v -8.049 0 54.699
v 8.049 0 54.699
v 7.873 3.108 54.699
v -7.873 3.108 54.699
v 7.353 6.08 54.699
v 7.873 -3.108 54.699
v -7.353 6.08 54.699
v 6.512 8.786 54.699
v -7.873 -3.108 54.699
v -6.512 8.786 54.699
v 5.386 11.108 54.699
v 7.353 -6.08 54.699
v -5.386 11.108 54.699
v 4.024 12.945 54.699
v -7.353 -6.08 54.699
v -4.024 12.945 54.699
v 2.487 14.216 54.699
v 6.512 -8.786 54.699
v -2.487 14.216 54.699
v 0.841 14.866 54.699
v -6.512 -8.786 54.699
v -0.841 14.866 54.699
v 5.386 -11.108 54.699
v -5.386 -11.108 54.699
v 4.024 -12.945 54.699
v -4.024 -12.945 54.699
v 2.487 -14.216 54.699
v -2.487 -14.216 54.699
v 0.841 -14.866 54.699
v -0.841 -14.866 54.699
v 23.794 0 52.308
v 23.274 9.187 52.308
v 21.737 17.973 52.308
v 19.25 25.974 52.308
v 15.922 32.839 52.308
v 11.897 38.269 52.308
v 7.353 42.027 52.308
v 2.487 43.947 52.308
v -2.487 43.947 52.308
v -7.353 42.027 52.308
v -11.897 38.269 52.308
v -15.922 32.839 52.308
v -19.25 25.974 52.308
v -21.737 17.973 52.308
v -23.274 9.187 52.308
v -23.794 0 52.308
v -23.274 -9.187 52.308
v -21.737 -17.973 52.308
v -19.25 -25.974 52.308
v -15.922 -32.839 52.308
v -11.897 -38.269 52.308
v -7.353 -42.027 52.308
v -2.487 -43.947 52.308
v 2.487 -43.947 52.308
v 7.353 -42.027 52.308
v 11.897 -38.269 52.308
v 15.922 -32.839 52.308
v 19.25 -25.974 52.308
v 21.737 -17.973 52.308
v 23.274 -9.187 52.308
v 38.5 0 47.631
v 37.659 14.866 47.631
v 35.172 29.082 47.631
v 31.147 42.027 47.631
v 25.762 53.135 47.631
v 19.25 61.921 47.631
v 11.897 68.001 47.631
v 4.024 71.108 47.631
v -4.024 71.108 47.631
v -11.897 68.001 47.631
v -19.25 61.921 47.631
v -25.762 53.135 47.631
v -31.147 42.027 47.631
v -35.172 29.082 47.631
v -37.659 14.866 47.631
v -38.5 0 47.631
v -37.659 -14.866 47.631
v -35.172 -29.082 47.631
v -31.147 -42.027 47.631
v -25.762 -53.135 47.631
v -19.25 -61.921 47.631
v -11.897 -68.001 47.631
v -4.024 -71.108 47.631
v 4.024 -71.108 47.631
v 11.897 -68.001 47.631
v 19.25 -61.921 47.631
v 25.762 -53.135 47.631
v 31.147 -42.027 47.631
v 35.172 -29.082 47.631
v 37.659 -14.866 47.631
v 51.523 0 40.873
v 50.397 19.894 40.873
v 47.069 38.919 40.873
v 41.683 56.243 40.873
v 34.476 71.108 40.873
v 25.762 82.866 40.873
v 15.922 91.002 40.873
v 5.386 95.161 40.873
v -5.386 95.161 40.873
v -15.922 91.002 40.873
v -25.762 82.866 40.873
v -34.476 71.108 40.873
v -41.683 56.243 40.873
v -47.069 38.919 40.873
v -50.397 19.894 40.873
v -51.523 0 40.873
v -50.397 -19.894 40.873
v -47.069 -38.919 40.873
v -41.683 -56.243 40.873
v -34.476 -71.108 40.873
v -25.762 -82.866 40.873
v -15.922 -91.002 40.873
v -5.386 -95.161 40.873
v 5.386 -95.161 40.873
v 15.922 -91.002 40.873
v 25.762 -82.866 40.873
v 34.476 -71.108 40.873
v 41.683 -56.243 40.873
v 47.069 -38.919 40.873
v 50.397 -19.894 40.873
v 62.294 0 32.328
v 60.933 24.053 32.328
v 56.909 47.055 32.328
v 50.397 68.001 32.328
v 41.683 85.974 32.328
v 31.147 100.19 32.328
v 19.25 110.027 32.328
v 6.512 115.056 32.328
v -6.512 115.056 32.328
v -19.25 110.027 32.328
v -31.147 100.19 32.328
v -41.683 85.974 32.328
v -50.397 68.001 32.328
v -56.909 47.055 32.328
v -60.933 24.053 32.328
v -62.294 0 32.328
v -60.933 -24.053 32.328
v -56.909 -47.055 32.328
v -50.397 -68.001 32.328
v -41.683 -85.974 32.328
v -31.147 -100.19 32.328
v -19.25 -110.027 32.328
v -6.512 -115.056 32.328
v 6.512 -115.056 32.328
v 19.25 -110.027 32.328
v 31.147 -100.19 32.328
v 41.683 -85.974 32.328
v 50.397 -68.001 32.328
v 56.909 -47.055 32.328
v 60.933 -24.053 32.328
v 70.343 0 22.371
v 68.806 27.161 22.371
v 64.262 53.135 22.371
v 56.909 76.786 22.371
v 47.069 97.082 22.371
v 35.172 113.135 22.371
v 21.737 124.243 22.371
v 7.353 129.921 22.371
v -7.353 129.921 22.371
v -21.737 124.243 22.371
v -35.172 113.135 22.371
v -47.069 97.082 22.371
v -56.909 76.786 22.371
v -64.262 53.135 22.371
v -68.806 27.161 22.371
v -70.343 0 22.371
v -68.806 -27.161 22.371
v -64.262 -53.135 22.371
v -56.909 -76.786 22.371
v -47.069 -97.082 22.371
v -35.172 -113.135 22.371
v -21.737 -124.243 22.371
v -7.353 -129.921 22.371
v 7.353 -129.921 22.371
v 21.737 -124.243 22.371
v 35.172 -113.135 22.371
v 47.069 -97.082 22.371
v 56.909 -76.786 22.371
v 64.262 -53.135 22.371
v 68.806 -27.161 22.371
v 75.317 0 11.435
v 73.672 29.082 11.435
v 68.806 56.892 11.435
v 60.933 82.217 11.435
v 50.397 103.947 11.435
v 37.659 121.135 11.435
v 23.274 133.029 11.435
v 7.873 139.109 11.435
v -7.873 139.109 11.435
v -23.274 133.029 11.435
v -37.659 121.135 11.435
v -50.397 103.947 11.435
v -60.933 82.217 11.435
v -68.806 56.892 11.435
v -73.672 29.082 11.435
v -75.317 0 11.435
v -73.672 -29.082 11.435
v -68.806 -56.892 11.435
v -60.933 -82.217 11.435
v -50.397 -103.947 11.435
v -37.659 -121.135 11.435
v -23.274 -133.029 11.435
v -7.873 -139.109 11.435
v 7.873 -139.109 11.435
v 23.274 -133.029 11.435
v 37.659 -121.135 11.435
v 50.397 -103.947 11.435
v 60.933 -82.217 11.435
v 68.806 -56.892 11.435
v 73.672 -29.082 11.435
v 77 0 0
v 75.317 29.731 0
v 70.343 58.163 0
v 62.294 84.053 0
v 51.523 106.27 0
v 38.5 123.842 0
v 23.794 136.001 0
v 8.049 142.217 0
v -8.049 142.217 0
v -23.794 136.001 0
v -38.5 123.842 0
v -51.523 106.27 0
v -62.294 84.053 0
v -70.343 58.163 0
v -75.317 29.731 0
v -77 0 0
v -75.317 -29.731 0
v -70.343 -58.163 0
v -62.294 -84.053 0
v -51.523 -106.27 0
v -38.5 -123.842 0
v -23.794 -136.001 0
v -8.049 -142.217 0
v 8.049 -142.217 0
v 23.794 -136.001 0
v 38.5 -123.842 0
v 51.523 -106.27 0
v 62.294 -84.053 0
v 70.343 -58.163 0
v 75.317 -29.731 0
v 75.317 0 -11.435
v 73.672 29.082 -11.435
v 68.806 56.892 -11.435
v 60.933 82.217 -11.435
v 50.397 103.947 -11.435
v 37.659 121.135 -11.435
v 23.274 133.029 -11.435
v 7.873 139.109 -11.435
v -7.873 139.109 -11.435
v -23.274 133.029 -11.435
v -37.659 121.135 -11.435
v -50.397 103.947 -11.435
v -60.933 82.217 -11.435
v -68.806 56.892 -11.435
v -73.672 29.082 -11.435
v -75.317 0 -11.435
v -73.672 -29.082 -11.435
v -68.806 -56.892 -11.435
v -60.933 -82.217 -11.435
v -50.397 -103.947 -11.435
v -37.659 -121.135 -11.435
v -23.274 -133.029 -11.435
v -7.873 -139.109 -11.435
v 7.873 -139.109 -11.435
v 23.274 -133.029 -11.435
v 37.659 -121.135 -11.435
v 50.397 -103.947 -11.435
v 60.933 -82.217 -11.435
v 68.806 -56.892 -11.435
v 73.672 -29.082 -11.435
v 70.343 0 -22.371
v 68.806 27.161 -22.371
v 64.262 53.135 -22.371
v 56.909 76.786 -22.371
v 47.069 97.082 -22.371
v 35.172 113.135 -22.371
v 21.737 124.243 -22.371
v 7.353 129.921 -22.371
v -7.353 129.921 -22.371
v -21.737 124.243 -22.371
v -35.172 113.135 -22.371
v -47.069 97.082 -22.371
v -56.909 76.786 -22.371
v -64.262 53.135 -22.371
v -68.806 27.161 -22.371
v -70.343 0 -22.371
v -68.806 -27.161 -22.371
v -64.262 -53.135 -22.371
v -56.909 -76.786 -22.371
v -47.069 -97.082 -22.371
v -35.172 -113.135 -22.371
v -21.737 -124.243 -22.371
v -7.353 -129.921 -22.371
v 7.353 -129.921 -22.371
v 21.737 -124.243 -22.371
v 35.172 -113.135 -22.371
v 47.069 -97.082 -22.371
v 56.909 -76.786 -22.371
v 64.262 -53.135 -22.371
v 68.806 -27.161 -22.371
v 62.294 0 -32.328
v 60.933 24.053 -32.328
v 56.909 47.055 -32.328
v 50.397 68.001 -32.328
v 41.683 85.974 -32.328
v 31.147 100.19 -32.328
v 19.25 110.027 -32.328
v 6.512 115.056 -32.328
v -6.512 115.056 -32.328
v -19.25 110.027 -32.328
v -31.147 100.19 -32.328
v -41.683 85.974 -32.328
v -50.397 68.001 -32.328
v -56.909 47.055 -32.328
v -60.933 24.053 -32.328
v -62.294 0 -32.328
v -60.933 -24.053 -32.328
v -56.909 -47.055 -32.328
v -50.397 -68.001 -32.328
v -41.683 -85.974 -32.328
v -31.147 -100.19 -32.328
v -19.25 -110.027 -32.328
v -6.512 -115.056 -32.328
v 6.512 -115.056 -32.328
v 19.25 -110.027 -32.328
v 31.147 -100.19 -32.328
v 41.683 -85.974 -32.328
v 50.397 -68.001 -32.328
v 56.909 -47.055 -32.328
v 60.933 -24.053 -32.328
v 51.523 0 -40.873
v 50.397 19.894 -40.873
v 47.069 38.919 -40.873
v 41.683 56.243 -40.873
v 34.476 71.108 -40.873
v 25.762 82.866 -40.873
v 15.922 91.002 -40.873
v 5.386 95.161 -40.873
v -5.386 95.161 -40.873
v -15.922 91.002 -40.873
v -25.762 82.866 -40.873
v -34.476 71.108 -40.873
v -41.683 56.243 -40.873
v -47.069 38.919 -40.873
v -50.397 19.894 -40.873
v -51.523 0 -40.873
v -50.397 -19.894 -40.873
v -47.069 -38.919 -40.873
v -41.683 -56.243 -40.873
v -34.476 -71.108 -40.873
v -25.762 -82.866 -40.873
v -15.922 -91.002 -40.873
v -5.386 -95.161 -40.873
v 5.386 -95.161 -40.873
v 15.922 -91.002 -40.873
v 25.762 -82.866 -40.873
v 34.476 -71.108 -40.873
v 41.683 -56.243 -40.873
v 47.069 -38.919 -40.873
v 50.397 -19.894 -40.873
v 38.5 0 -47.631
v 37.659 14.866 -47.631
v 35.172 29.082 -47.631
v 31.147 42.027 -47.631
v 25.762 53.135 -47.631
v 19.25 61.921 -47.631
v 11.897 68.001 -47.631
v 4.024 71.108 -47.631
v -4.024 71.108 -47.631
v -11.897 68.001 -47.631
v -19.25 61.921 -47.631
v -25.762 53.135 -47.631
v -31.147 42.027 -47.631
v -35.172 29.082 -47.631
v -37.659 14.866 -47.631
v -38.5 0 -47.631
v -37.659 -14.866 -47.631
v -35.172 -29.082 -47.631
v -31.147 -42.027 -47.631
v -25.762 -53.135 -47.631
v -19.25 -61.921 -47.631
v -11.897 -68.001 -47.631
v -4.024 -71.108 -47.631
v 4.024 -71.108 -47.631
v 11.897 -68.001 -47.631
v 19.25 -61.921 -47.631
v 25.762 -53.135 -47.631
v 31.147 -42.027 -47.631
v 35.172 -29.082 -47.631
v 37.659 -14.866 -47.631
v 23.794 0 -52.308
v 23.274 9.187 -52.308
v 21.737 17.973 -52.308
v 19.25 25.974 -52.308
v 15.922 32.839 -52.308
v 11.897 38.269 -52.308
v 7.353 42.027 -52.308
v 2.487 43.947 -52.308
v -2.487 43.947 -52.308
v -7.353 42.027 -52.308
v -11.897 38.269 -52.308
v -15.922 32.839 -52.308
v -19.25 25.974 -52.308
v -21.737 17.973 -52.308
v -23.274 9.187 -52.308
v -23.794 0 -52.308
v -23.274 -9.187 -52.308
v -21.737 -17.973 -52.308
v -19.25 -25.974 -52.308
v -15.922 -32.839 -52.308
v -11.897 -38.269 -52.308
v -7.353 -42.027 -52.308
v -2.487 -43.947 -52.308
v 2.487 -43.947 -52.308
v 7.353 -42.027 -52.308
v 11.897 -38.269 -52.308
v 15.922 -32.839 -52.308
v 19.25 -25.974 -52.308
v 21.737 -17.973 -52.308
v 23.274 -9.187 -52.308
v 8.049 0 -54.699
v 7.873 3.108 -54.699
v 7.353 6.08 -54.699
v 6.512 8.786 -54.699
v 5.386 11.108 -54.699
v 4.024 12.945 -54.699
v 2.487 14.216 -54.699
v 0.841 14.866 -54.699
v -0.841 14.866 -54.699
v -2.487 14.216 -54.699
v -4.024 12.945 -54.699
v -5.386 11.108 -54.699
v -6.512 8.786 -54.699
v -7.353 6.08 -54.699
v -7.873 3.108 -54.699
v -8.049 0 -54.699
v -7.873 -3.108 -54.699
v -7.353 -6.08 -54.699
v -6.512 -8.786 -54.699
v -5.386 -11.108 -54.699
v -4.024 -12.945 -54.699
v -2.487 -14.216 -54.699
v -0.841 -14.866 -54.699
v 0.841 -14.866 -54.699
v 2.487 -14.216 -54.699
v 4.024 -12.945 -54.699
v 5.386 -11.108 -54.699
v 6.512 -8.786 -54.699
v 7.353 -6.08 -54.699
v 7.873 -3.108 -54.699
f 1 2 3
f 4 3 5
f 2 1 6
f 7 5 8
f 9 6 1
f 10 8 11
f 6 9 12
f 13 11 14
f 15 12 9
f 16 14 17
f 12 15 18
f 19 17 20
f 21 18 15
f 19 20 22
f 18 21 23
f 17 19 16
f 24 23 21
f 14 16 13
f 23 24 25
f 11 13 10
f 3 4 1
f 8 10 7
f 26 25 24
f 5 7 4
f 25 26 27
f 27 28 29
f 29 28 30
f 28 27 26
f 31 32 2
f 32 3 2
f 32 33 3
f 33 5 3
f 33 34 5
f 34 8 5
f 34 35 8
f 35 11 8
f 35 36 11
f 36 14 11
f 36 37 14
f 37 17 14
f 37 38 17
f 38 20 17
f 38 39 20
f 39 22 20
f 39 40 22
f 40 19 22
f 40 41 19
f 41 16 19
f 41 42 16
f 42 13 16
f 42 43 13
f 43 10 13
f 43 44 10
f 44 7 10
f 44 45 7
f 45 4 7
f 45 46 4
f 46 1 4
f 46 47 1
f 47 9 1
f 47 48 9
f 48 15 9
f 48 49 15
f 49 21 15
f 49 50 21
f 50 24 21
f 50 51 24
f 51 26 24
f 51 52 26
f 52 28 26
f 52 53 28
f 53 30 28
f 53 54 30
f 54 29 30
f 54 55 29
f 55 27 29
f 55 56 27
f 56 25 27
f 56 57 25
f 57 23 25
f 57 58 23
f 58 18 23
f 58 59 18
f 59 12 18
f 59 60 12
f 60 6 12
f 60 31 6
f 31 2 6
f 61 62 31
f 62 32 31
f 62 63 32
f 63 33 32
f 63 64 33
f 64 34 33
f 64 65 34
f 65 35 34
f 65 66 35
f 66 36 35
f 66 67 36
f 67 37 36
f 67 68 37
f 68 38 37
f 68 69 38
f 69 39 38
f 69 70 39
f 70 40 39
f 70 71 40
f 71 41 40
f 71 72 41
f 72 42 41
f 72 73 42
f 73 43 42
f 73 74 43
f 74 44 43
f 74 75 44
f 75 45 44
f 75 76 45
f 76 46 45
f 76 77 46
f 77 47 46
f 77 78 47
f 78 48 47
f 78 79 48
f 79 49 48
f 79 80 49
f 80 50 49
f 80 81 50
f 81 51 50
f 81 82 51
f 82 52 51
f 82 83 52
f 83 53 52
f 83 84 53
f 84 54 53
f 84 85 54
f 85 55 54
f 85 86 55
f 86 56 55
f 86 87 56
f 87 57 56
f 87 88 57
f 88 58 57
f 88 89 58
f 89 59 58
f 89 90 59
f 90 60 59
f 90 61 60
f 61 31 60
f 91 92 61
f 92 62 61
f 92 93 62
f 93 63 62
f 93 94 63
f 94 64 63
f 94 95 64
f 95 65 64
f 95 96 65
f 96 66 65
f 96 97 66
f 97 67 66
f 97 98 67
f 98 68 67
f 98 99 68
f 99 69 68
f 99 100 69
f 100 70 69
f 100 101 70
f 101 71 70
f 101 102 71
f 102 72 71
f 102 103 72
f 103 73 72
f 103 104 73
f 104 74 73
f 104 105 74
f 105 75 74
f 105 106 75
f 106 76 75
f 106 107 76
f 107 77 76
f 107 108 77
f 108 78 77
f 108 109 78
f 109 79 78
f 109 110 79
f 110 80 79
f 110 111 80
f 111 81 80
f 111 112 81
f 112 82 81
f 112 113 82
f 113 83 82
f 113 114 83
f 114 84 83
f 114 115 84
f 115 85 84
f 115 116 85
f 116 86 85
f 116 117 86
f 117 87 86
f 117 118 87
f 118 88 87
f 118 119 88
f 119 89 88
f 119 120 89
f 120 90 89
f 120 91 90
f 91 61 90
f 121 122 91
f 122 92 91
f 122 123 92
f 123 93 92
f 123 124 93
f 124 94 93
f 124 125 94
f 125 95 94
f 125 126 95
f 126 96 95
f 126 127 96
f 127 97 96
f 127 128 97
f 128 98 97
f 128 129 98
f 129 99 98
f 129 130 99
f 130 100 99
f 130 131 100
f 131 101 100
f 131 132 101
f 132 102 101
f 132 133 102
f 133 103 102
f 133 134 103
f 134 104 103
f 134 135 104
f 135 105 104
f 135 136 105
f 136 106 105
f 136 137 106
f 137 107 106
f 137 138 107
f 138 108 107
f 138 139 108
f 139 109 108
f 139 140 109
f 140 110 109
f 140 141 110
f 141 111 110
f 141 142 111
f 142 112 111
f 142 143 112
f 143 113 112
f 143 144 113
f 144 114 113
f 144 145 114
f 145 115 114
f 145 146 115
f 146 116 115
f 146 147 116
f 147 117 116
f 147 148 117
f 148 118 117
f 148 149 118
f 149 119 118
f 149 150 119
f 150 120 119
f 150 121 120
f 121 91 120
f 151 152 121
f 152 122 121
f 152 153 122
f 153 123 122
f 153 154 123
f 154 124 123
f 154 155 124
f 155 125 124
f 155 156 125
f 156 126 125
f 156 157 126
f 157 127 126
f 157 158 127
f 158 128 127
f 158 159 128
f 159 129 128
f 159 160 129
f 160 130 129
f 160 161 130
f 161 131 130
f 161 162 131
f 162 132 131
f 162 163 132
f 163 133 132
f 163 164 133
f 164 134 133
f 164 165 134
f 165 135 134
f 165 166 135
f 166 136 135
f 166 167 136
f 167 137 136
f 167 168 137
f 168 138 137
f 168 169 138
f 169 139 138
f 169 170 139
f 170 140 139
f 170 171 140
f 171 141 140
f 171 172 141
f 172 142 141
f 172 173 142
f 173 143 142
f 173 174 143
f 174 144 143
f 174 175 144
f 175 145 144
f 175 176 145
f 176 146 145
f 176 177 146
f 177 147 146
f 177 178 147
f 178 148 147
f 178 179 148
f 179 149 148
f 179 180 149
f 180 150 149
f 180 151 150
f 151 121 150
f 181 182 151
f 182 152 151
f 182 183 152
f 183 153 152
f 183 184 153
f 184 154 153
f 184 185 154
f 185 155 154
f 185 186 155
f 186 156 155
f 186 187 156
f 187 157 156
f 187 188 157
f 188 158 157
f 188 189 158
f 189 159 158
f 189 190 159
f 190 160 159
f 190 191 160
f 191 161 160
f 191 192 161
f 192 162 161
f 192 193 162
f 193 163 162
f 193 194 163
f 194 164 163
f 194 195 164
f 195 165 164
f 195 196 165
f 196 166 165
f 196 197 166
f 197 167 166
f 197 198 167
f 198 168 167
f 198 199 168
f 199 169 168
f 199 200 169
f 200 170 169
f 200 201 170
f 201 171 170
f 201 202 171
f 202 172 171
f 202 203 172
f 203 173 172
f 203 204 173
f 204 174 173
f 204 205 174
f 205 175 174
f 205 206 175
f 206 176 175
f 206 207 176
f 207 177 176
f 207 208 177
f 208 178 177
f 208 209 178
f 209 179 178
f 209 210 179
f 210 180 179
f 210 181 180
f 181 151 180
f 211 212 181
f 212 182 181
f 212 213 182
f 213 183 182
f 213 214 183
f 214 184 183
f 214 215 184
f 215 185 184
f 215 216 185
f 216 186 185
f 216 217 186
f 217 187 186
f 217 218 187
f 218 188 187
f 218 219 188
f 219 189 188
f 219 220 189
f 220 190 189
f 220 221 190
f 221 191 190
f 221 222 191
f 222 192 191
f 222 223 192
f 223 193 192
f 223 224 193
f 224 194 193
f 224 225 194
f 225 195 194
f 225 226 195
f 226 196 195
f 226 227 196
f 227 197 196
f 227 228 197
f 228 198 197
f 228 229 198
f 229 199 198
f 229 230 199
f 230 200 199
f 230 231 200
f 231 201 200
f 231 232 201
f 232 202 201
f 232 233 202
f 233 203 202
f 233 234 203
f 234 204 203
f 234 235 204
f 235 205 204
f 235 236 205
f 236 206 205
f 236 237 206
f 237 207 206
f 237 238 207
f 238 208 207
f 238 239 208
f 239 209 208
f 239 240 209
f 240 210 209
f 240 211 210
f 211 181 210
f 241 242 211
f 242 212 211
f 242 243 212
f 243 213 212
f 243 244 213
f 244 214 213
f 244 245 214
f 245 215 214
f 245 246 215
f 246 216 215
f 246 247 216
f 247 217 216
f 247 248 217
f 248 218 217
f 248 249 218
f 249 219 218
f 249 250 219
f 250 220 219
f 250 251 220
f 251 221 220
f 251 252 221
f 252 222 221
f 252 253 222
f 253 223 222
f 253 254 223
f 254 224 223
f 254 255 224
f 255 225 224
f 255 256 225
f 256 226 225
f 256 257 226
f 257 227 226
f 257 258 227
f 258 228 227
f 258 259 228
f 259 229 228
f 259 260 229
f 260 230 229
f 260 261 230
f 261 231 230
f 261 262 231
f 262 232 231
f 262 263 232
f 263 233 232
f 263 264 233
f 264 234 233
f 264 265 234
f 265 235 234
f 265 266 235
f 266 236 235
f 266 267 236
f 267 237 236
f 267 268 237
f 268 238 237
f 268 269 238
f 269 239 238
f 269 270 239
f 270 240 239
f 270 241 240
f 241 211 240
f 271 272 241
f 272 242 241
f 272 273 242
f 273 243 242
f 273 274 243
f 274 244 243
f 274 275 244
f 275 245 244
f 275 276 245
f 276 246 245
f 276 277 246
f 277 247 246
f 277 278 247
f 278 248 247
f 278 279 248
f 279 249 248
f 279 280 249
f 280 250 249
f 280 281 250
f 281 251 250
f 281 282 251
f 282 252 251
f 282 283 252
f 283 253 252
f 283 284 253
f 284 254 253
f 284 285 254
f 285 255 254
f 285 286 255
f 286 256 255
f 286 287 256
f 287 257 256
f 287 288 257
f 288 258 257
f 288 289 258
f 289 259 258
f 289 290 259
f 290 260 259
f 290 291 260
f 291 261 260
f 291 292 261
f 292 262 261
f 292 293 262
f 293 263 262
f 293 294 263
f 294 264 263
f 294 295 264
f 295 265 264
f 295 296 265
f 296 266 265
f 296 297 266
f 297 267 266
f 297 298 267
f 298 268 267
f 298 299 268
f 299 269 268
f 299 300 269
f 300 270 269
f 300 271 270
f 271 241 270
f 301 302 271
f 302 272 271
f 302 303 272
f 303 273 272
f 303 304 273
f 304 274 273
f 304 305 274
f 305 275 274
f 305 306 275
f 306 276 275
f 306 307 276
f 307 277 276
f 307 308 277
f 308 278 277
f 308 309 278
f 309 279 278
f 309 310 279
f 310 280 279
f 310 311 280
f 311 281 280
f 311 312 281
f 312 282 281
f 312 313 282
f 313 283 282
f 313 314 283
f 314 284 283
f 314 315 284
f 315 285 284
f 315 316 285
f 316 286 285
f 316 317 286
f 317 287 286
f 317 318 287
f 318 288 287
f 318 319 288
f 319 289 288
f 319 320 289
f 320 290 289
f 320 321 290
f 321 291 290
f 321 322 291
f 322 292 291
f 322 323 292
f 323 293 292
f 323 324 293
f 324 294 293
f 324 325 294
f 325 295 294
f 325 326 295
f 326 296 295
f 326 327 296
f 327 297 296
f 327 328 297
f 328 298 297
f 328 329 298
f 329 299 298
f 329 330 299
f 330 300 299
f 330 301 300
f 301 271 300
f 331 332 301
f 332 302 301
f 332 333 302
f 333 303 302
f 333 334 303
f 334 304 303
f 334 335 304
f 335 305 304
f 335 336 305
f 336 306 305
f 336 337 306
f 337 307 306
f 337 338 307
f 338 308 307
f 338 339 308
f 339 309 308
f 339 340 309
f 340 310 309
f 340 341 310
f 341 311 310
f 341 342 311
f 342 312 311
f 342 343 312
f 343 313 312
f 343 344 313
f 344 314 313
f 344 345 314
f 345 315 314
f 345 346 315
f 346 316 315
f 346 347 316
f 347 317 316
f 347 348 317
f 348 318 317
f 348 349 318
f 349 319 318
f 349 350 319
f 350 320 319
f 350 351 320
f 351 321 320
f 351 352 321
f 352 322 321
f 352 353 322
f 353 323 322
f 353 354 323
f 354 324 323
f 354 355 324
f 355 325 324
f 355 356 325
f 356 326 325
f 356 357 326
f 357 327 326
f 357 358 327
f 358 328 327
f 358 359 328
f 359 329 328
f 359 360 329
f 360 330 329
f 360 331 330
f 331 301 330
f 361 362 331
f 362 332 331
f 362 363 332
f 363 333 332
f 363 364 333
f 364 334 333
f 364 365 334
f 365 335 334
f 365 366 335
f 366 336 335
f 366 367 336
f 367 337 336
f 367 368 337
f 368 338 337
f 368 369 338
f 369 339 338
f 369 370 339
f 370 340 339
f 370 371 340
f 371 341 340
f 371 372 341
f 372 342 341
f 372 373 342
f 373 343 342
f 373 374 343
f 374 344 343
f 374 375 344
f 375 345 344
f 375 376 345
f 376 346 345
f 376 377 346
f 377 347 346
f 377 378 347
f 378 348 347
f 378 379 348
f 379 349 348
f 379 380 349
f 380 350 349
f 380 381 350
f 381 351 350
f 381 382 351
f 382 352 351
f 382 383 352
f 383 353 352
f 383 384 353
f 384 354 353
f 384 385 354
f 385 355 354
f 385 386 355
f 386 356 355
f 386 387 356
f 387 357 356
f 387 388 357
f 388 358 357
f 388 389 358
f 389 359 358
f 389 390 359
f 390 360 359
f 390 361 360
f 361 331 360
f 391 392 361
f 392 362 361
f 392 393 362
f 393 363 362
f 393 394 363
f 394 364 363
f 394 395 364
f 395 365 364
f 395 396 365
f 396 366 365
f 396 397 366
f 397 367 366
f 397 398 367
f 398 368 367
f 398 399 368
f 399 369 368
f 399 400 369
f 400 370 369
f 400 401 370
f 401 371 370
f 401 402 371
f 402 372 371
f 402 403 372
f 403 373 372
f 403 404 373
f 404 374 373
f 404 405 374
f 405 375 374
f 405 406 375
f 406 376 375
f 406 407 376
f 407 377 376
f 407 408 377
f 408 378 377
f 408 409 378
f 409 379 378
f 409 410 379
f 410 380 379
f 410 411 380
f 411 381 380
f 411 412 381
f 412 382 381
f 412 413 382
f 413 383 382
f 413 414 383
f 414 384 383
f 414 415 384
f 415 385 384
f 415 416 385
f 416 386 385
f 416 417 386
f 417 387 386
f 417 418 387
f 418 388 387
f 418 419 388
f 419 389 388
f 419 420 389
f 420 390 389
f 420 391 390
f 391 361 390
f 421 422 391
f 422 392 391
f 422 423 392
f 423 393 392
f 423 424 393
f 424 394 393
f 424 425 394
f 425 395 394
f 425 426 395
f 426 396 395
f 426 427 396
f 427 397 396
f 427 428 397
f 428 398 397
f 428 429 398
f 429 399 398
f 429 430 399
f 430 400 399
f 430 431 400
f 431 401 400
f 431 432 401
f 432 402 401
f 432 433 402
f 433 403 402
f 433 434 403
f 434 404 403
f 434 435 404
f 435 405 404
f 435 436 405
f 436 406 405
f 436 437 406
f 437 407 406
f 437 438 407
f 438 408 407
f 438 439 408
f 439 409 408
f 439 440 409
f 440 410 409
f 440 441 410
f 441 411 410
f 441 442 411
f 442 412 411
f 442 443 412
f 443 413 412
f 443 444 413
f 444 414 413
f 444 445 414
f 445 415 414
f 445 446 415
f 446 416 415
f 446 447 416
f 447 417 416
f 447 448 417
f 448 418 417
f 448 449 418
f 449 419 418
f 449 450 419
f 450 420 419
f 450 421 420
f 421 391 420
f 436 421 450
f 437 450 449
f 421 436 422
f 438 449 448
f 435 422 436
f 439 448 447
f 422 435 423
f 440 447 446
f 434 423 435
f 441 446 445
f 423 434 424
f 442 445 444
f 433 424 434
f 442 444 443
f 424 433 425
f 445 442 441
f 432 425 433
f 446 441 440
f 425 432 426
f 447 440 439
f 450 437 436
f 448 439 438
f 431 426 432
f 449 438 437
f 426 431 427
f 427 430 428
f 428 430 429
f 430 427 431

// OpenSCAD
// Generated by SolidPython 1.0.1 on 2020-07-29 00:46:47


scale(v = [7, 13, 5]) {
	sphere(r = 11);
}
/***********************************************
*********      SolidPython code:      **********
************************************************
 
# import packages: SolidPython
from solid import *
from solid.utils import *
from itertools import chain, combinations, permutations


class Resize:

    def __init__(self, scad_file):
        self.scad_file = scad_file
        #self.scad_file = import_scad(scad_file)
        # cone/cylinder param:
        self.r1 = 0
        self.r2 = 0
        self.h = 0
        # rectangular prism param:
        self.w = 0
        self.l = 0
        # ellipse param:
        self.r = 0

    # import OpenScad code (file name corresponds to shape)


    # classify shape + parameters
    def assign(self, param1, param2, param3):
        if self.scad_file == 'cone.scad':
            self.r1 = param1
            self.r2 = param2
            self.h = param3
        elif self.scad_file == 'cylinder.scad':
            self.r1 = param1
            self.r2 = param2
            self.h = param3
        elif self.scad_file == 'rectangularPrism.scad':
            self.h = param1
            self.l = param2
            self.w = param3
        else:
            self.r = param1
            self.h = param2

    # resize parameters
    def iterate(self):
        x = range(3, 20, 2)
        i = 1
        if self.scad_file == 'cone.scad':
            tempList = list(permutations(x, 2))
            for temp in tempList:
                param1 = temp[0]
                param2 = temp[1]
                filepath = 'produced_scad_files/' + 'cone' + str(param1) + '_' + str(param2) + '_' + '.scad'
                scad_render_to_file(cylinder(h=param1, r1=param2, r2=0), filepath)

        elif self.scad_file == 'cylinder.scad':
            tempList = list(permutations(x, 3))
            for temp in tempList:
                param1 = temp[0]
                param2 = temp[1]
                filepath = 'produced_scad_files/' + 'cylinder' + str(param1) + '_' + str(param2) + '_' + '.scad'
                scad_render_to_file(cylinder(h=param1, r1=param2, r2=param2), filepath)

        elif self.scad_file == 'rectangularPrism.scad':
            tempList = list(permutations(x, 3))
            for temp in tempList:
                param1 = temp[0]
                param2 = temp[1]
                param3 = temp[2]
                filepath = 'produced_scad_files/' + 'rectangularPrism' + str(param1) + '_' + str(param2) + '_' + str(
                    param3) + '.scad'
                scad_render_to_file(cube(size=(param1, param2, param3)), filepath)

        elif self.scad_file == 'ellipse.scad':
            tempList = list(permutations(x, 4))
            for temp in tempList:
                param1 = temp[0]
                param2 = temp[1]
                param3 = temp[2]
                param4 = temp[3]
                filepath = 'produced_scad_files/' + 'ellipse' + str(param1) + '_' + str(param2) + '_' + str(param3) + '_' + str(param4) + '.scad'
                scad_render_to_file(scale([param1, param2, param3])(sphere(r=param4)), filepath)

    def render_to_scadfile(self):
        scad_render_to_file(scad, 'example.scad') 
 
************************************************/
